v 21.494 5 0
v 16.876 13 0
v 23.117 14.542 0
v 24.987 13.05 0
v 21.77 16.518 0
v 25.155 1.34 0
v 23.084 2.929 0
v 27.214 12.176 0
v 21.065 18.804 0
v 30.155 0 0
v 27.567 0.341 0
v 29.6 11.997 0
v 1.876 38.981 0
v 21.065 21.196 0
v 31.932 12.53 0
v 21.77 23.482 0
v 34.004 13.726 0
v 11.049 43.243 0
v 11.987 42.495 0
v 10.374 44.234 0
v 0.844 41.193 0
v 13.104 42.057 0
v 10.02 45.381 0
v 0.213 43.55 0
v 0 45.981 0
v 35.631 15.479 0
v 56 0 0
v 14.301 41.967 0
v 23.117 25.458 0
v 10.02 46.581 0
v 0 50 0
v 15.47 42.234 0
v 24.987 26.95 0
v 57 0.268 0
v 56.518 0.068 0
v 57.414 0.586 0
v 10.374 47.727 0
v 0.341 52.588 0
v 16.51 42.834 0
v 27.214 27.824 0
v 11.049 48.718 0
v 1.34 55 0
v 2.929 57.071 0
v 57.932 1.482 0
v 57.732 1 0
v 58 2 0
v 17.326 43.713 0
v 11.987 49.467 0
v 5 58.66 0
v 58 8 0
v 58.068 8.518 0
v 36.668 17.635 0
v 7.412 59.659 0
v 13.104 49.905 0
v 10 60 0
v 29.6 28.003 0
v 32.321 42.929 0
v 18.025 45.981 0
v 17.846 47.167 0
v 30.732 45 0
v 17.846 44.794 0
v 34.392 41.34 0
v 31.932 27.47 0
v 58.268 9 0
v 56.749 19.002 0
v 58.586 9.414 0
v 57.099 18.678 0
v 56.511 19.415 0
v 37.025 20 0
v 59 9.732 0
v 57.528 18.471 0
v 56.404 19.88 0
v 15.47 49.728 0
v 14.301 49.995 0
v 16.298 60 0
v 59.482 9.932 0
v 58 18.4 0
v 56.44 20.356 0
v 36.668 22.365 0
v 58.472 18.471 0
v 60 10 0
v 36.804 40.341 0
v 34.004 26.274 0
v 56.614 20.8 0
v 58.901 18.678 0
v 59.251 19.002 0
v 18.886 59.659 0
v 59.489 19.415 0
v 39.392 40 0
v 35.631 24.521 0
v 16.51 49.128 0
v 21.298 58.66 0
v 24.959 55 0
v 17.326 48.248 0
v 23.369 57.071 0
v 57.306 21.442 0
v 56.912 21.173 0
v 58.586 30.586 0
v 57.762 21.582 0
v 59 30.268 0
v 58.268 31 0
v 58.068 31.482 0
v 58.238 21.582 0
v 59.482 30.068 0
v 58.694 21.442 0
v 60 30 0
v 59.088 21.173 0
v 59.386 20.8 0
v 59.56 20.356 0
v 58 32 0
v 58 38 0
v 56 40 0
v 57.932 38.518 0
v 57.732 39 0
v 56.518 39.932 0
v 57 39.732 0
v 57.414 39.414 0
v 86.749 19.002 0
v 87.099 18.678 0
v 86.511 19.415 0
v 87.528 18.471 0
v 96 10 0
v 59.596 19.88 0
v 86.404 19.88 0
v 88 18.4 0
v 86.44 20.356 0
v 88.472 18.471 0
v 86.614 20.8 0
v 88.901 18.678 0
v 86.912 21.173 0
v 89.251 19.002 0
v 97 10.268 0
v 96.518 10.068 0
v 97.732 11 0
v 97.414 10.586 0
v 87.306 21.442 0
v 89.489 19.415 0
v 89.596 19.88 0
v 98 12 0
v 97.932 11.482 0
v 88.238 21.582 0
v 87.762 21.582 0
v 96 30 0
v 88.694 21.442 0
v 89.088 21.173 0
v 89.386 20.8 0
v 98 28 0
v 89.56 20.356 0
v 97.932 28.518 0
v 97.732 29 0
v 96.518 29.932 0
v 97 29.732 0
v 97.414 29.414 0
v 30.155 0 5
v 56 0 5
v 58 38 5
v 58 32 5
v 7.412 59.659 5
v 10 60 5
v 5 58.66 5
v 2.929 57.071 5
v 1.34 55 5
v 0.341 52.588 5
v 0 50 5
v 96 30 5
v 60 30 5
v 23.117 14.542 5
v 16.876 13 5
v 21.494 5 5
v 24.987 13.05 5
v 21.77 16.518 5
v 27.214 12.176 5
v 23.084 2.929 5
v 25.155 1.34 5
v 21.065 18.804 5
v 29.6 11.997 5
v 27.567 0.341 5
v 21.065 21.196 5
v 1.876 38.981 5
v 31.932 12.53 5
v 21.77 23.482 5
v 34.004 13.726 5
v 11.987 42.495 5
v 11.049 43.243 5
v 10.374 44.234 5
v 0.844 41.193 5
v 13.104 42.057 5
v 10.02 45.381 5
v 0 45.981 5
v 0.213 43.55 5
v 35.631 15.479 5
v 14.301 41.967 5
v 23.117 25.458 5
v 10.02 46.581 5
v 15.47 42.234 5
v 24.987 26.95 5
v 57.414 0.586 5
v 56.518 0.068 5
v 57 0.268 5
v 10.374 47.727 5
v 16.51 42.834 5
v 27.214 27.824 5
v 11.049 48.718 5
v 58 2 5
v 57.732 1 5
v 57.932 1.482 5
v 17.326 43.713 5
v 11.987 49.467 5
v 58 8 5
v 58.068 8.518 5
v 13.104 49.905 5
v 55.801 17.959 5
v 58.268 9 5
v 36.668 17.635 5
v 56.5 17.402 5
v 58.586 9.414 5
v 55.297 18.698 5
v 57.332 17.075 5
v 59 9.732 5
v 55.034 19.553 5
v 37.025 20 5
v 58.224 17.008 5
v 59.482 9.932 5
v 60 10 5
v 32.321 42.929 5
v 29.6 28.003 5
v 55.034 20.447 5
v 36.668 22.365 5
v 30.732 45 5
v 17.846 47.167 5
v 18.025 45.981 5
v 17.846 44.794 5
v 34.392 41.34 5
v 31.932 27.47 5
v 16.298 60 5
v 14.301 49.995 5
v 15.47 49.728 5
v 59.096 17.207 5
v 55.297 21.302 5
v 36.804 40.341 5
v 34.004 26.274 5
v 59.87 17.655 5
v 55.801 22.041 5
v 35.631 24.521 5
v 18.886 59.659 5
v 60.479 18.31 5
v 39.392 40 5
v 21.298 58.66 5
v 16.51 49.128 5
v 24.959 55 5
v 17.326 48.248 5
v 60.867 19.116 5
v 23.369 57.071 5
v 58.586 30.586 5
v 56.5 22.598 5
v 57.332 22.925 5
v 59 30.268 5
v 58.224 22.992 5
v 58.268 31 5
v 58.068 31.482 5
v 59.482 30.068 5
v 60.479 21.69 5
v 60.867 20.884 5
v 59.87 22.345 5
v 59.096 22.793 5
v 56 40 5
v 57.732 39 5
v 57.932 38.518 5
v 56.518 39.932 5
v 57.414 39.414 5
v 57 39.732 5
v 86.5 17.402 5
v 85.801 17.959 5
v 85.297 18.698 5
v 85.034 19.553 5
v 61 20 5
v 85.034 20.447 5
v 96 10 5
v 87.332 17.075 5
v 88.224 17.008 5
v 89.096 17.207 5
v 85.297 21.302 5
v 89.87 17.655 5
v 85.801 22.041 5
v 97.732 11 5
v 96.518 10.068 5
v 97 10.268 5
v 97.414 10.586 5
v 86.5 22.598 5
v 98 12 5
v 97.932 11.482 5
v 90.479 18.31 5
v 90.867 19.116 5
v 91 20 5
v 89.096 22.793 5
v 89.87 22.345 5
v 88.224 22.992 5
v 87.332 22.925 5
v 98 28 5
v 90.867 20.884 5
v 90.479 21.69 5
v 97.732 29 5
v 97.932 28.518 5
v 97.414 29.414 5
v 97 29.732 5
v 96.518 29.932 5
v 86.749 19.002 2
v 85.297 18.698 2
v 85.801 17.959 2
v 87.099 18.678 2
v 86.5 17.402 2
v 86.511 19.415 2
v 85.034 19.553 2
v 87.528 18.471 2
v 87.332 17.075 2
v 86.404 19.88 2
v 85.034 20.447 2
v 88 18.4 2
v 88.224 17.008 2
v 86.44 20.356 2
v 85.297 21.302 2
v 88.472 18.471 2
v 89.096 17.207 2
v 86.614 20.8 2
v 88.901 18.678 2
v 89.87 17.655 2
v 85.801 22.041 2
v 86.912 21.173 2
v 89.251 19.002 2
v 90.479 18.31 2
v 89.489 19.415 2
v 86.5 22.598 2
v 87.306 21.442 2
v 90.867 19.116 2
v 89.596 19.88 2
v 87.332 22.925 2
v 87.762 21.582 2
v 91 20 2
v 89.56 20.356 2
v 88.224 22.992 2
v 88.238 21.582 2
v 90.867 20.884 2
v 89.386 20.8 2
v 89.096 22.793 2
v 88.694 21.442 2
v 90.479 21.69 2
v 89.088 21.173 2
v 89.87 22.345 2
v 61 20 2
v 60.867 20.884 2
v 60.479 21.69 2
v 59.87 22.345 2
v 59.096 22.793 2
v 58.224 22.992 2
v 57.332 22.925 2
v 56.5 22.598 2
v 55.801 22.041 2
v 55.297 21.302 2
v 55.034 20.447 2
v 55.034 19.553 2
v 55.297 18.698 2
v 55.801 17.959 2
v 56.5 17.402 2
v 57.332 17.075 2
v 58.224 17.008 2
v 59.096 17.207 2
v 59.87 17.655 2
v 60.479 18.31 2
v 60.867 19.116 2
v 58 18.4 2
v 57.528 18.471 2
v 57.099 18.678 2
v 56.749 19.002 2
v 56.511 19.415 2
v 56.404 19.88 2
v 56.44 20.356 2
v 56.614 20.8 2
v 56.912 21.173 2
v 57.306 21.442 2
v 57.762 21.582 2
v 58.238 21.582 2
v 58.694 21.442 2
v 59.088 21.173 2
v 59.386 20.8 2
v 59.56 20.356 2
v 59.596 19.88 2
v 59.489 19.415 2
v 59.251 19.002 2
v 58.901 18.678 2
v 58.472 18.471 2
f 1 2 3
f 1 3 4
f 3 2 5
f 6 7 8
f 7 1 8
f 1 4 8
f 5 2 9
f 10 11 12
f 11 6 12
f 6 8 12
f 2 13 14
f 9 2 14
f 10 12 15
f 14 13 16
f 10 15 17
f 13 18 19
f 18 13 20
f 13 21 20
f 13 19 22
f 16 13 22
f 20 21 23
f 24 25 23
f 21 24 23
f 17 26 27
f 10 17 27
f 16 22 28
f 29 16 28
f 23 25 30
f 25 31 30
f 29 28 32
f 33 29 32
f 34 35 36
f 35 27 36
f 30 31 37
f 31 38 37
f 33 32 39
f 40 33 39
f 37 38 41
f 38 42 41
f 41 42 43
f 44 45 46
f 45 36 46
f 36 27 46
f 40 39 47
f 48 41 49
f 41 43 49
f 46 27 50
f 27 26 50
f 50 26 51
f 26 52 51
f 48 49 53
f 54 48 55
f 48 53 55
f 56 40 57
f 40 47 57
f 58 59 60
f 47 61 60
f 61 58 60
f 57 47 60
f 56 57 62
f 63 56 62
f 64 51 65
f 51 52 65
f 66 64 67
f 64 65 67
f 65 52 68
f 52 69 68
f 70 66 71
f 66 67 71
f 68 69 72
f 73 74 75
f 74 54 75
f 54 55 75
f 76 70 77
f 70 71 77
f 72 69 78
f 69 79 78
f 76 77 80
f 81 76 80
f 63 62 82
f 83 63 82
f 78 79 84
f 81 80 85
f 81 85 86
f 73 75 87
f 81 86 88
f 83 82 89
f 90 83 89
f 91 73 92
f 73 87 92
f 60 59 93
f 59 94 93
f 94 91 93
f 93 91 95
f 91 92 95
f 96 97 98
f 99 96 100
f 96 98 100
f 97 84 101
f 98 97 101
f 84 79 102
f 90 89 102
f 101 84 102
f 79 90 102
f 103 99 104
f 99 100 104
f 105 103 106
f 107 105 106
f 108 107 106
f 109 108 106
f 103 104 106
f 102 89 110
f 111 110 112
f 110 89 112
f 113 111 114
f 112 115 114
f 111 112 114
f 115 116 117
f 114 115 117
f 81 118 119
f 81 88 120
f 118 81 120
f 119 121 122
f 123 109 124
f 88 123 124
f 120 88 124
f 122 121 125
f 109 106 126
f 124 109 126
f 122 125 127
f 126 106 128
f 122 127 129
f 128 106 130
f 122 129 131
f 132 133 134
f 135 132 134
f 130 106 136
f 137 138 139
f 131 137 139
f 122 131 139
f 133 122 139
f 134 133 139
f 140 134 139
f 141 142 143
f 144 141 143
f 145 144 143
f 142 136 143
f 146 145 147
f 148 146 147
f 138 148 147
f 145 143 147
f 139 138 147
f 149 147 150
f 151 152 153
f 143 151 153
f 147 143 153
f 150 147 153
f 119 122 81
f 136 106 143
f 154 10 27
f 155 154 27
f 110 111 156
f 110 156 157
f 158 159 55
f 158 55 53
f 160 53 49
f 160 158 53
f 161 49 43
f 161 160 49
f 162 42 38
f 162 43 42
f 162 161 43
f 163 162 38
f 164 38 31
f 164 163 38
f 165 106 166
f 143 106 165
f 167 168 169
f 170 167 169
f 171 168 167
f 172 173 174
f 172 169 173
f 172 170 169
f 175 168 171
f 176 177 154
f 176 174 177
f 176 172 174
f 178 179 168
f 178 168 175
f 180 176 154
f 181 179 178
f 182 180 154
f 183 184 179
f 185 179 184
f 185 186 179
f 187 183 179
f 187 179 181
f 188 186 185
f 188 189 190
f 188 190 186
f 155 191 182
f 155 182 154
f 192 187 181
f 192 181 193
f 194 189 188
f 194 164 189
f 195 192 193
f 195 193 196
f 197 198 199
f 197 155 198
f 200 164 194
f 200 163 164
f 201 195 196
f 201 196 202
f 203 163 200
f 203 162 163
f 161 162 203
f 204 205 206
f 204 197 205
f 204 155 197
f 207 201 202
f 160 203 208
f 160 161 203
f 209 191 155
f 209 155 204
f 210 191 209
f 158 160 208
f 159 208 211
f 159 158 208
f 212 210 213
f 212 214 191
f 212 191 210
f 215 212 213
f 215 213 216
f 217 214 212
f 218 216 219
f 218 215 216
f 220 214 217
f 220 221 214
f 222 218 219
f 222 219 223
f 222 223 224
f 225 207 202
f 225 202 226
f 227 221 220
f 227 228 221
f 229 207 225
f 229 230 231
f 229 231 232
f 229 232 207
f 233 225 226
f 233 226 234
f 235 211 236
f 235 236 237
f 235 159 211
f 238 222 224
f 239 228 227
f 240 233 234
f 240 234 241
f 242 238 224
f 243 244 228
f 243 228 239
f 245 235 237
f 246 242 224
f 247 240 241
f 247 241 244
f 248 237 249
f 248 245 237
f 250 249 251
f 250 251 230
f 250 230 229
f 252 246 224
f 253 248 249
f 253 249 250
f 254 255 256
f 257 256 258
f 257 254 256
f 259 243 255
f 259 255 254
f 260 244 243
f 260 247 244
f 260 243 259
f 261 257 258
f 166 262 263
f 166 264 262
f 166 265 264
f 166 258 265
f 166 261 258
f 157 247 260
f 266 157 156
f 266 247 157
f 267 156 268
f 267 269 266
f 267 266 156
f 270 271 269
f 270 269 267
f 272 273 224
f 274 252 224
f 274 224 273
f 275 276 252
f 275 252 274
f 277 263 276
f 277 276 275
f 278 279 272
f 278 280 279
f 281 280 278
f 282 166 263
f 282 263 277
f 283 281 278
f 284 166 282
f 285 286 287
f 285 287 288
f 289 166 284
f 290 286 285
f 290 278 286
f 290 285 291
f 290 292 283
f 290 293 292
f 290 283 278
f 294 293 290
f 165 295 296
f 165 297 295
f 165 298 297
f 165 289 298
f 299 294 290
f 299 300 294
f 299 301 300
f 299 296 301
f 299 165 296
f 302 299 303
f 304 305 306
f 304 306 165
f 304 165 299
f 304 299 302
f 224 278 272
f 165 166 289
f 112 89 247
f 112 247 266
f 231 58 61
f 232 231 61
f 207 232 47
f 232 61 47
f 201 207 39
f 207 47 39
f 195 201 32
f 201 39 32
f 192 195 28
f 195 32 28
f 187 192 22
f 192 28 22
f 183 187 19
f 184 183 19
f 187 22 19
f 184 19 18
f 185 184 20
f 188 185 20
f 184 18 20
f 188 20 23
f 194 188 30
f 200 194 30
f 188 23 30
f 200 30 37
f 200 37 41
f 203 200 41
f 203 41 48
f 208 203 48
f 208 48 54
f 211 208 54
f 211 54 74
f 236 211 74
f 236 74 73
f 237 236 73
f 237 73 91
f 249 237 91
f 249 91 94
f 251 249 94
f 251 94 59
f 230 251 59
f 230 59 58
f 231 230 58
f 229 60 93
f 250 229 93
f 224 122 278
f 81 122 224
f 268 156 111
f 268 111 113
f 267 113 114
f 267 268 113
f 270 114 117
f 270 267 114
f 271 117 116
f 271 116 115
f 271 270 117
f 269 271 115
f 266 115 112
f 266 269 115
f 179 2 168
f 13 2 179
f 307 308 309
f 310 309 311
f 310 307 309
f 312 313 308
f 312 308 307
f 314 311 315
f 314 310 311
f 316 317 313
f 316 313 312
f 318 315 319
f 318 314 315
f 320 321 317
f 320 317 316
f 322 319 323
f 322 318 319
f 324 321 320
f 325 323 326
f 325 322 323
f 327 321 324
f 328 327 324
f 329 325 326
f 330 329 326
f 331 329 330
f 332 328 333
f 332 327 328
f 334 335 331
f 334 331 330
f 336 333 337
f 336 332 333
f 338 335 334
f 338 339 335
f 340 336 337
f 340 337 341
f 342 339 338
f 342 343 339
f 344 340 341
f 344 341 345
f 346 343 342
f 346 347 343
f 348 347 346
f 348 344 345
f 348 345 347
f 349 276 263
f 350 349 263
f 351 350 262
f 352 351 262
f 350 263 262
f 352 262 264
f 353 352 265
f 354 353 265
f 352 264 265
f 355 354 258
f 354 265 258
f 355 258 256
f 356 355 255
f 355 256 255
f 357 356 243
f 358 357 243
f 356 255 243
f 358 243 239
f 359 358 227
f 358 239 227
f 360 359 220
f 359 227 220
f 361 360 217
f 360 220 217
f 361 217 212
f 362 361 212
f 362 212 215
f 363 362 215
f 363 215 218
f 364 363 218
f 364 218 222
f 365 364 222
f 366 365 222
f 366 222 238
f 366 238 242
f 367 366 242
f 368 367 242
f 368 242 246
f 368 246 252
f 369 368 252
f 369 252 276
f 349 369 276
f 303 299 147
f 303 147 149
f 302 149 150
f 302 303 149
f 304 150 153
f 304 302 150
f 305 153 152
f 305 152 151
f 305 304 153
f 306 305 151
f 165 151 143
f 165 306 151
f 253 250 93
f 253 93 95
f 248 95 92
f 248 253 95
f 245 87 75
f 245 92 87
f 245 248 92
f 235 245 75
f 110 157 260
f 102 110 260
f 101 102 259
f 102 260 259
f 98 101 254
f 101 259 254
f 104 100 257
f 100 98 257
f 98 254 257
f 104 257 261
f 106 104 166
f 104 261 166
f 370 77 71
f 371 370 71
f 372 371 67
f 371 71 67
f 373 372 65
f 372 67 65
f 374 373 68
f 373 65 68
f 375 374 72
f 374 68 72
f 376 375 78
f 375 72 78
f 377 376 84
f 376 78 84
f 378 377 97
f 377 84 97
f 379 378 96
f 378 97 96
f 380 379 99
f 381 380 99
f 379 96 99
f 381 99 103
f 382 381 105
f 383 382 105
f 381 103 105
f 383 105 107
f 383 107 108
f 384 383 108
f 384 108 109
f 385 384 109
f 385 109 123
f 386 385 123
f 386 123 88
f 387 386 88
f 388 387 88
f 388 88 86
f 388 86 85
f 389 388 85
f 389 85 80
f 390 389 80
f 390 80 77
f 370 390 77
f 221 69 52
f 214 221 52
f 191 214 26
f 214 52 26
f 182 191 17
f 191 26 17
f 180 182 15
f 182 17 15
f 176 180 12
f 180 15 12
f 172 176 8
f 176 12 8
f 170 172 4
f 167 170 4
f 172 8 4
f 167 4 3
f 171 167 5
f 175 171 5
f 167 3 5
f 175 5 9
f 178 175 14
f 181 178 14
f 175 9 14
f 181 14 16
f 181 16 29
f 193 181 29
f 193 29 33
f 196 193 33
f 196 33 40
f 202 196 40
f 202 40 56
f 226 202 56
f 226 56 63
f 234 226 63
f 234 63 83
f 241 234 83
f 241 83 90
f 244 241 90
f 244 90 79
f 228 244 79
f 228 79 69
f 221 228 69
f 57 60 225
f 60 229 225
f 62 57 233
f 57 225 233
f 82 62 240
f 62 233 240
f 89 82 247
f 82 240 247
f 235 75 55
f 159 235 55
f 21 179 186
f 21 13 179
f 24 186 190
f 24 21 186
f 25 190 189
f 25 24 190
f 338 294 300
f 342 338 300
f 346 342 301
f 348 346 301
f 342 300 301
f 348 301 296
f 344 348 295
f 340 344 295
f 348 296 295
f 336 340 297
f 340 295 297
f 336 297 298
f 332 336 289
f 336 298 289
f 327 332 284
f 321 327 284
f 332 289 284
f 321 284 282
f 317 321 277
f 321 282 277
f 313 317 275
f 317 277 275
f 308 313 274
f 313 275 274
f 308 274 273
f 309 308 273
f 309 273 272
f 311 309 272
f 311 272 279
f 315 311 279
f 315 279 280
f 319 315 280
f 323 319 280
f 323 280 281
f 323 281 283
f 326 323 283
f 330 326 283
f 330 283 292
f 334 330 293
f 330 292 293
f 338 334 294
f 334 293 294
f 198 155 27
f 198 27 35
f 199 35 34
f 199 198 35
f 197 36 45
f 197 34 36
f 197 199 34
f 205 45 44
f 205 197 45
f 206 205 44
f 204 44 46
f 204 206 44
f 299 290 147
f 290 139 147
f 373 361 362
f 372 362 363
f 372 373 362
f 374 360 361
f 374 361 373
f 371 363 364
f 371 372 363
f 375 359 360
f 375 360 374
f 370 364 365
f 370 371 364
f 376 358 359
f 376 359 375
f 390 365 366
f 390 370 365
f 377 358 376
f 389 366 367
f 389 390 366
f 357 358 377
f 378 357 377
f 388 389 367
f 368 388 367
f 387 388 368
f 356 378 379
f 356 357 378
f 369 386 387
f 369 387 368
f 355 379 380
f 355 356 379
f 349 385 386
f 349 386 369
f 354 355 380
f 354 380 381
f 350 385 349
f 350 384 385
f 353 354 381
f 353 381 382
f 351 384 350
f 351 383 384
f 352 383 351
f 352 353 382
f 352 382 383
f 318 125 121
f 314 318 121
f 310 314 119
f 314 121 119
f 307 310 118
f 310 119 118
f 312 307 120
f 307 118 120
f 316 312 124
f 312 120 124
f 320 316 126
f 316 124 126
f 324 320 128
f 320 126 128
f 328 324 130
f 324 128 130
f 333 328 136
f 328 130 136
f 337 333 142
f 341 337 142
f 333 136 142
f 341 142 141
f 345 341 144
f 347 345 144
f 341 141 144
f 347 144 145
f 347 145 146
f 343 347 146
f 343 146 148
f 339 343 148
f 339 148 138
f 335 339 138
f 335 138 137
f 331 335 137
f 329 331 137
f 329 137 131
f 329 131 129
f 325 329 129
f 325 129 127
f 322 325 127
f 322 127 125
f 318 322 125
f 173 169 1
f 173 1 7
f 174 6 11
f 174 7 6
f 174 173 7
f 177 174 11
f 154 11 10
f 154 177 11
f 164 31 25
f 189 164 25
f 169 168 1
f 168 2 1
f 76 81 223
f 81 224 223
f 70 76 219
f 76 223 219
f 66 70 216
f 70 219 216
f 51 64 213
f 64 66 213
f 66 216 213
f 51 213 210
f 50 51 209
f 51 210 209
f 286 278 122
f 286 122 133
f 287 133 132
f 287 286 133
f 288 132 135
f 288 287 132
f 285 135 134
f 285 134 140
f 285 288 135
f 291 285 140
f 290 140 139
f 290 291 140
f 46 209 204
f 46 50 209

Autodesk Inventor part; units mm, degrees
ref_plane "YZ Plane" through (0, 0, 0) normal (1, 0, 0) x (0, 1, 0)
ref_plane "XZ Plane" through (0, 0, 0) normal (0, 1, 0) x (-1, 0, 0)
ref_plane "XY Plane" through (0, 0, 0) normal (0, 0, 1) x (1, 0, 0)
sketch "スケッチ1" plane through (0, 0, 0) normal (0, 0, 1) x (1, 0, 0)
  line L0 (0, 0) -> (98, 0)
  line L1 (98, 0) -> (98, 60)
  line L2 (98, 60) -> (0, 60)
  line L3 (0, 60) -> (0, 0)
  line L4 (98, 0) -> (29, 0)
  line L5 (29, 0) -> (29, 40)
  line L6 (29, 40) -> (98, 40)
  line L7 (98, 40) -> (98, 0)
  line L8 (29, 30) -> (98, 30)
  line L9 (98, 30) -> (98, 10)
  line L10 (98, 10) -> (29, 10)
  line L11 (29, 10) -> (29, 30)
  line L12 (98, 20) -> (0, 20)
  line L13 (29, 20) -> (5.906, 60)
  circle A0 centre (29, 20) radius 8.025
  circle A1 centre (14, 45.9808) radius 4.025
  line L14 (58, 40) -> (58, 0)
  line L15 (16.8756, 13) -> (-6.2184, 53)
  line L16 (41.1244, 27) -> (18.0303, 67)
  circle A2 centre (14, 45.9808) radius 14
  line L17 (16.8756, 13) -> (25.3526, -1.6825)
  point P0 (58, 30)
  point P1 (33.6188, 40)
  point P2 (22.0718, 60)
  point P3 (0, 45.9808)
  point P4 (1.8756, 38.9808)
  point P5 (24.3812, 0)
  point P6 (58, 0)
  point P7 (58, 10)
  dimension "d0" = 98
  dimension "d1" = 60
  dimension "d2" = 40
  dimension "d3" = 20
  dimension "d4" = 10
  dimension "d5" = 69
  dimension "d6" = 30
  dimension "d7" = 16.05
  dimension "d8" = 30
  dimension "d9" = 8.05
  dimension "d10" = 40
  dimension "d11" = 28
extrude "押し出し1" add sketch "スケッチ1" along normal blind 5 contours L5 L10 L14 L0 | L0 L17 L15 L12 A0 L5 | L5 A0 L12 L14 L10 | L14 L12 L1 L10 | L14 L8 L1 L12 | L12 A0 L5 L8 L14 | L15 A2 L13 A0 L12 | L8 L16 L6 L14 | A2 L13 A1 | A0 L13 A2 L16 L6 L5 | L8 L5 L6 L16 | L3 L2 L13 A2 | L13 A1 A2 | L13 L2 L16 A2
sketch "スケッチ2" plane through (0, 0, 5) normal (0, 0, 1) x (1, 0, 0)
  line L0 (98, 10) -> (98, 30) projected
  line L1 (98, 20) -> (47.1161, 20)
  point P0 (0, 0)
  point P1 (88, 20)
  point P2 (58, 20)
  dimension "d14" = 10
  dimension "d15" = 30
hole "穴1" at (88, 20, 5) at (58, 20, 5) direction (0, 0, -1) diameter 3.2 depth 10
fillet "フィレット1" radius 2 6 edges at (58, 40, 2.5) (58, 30, 2.5) (98, 30, 2.5) (98, 10, 2.5) (58, 0, 2.5) (58, 10, 2.5)
fillet "フィレット2" radius 10 4 edges at (24.3812, 0, 2.5) (0, 60, 2.5) (22.0718, 60, 2.5) (33.6188, 40, 2.5)
sketch "スケッチ4" plane through (0, 0, 5) normal (0, 0, 1) x (1, 0, 0)
  circle A0 centre (58, 20) radius 1.6 projected
  circle A1 centre (58, 20) radius 3
  circle A2 centre (88, 20) radius 1.6 projected
  circle A3 centre (88, 20) radius 3
  point P0 (0, 0)
  dimension "d34" = 6
  dimension "d35" = 6
extrude "押し出し2" cut sketch "スケッチ4" against normal blind 3 contours A0 | A1 | A2 | A3
equation "\"d35\" = d34"
properties part number "RP_Calf-Link-cover-Outside-Right"
